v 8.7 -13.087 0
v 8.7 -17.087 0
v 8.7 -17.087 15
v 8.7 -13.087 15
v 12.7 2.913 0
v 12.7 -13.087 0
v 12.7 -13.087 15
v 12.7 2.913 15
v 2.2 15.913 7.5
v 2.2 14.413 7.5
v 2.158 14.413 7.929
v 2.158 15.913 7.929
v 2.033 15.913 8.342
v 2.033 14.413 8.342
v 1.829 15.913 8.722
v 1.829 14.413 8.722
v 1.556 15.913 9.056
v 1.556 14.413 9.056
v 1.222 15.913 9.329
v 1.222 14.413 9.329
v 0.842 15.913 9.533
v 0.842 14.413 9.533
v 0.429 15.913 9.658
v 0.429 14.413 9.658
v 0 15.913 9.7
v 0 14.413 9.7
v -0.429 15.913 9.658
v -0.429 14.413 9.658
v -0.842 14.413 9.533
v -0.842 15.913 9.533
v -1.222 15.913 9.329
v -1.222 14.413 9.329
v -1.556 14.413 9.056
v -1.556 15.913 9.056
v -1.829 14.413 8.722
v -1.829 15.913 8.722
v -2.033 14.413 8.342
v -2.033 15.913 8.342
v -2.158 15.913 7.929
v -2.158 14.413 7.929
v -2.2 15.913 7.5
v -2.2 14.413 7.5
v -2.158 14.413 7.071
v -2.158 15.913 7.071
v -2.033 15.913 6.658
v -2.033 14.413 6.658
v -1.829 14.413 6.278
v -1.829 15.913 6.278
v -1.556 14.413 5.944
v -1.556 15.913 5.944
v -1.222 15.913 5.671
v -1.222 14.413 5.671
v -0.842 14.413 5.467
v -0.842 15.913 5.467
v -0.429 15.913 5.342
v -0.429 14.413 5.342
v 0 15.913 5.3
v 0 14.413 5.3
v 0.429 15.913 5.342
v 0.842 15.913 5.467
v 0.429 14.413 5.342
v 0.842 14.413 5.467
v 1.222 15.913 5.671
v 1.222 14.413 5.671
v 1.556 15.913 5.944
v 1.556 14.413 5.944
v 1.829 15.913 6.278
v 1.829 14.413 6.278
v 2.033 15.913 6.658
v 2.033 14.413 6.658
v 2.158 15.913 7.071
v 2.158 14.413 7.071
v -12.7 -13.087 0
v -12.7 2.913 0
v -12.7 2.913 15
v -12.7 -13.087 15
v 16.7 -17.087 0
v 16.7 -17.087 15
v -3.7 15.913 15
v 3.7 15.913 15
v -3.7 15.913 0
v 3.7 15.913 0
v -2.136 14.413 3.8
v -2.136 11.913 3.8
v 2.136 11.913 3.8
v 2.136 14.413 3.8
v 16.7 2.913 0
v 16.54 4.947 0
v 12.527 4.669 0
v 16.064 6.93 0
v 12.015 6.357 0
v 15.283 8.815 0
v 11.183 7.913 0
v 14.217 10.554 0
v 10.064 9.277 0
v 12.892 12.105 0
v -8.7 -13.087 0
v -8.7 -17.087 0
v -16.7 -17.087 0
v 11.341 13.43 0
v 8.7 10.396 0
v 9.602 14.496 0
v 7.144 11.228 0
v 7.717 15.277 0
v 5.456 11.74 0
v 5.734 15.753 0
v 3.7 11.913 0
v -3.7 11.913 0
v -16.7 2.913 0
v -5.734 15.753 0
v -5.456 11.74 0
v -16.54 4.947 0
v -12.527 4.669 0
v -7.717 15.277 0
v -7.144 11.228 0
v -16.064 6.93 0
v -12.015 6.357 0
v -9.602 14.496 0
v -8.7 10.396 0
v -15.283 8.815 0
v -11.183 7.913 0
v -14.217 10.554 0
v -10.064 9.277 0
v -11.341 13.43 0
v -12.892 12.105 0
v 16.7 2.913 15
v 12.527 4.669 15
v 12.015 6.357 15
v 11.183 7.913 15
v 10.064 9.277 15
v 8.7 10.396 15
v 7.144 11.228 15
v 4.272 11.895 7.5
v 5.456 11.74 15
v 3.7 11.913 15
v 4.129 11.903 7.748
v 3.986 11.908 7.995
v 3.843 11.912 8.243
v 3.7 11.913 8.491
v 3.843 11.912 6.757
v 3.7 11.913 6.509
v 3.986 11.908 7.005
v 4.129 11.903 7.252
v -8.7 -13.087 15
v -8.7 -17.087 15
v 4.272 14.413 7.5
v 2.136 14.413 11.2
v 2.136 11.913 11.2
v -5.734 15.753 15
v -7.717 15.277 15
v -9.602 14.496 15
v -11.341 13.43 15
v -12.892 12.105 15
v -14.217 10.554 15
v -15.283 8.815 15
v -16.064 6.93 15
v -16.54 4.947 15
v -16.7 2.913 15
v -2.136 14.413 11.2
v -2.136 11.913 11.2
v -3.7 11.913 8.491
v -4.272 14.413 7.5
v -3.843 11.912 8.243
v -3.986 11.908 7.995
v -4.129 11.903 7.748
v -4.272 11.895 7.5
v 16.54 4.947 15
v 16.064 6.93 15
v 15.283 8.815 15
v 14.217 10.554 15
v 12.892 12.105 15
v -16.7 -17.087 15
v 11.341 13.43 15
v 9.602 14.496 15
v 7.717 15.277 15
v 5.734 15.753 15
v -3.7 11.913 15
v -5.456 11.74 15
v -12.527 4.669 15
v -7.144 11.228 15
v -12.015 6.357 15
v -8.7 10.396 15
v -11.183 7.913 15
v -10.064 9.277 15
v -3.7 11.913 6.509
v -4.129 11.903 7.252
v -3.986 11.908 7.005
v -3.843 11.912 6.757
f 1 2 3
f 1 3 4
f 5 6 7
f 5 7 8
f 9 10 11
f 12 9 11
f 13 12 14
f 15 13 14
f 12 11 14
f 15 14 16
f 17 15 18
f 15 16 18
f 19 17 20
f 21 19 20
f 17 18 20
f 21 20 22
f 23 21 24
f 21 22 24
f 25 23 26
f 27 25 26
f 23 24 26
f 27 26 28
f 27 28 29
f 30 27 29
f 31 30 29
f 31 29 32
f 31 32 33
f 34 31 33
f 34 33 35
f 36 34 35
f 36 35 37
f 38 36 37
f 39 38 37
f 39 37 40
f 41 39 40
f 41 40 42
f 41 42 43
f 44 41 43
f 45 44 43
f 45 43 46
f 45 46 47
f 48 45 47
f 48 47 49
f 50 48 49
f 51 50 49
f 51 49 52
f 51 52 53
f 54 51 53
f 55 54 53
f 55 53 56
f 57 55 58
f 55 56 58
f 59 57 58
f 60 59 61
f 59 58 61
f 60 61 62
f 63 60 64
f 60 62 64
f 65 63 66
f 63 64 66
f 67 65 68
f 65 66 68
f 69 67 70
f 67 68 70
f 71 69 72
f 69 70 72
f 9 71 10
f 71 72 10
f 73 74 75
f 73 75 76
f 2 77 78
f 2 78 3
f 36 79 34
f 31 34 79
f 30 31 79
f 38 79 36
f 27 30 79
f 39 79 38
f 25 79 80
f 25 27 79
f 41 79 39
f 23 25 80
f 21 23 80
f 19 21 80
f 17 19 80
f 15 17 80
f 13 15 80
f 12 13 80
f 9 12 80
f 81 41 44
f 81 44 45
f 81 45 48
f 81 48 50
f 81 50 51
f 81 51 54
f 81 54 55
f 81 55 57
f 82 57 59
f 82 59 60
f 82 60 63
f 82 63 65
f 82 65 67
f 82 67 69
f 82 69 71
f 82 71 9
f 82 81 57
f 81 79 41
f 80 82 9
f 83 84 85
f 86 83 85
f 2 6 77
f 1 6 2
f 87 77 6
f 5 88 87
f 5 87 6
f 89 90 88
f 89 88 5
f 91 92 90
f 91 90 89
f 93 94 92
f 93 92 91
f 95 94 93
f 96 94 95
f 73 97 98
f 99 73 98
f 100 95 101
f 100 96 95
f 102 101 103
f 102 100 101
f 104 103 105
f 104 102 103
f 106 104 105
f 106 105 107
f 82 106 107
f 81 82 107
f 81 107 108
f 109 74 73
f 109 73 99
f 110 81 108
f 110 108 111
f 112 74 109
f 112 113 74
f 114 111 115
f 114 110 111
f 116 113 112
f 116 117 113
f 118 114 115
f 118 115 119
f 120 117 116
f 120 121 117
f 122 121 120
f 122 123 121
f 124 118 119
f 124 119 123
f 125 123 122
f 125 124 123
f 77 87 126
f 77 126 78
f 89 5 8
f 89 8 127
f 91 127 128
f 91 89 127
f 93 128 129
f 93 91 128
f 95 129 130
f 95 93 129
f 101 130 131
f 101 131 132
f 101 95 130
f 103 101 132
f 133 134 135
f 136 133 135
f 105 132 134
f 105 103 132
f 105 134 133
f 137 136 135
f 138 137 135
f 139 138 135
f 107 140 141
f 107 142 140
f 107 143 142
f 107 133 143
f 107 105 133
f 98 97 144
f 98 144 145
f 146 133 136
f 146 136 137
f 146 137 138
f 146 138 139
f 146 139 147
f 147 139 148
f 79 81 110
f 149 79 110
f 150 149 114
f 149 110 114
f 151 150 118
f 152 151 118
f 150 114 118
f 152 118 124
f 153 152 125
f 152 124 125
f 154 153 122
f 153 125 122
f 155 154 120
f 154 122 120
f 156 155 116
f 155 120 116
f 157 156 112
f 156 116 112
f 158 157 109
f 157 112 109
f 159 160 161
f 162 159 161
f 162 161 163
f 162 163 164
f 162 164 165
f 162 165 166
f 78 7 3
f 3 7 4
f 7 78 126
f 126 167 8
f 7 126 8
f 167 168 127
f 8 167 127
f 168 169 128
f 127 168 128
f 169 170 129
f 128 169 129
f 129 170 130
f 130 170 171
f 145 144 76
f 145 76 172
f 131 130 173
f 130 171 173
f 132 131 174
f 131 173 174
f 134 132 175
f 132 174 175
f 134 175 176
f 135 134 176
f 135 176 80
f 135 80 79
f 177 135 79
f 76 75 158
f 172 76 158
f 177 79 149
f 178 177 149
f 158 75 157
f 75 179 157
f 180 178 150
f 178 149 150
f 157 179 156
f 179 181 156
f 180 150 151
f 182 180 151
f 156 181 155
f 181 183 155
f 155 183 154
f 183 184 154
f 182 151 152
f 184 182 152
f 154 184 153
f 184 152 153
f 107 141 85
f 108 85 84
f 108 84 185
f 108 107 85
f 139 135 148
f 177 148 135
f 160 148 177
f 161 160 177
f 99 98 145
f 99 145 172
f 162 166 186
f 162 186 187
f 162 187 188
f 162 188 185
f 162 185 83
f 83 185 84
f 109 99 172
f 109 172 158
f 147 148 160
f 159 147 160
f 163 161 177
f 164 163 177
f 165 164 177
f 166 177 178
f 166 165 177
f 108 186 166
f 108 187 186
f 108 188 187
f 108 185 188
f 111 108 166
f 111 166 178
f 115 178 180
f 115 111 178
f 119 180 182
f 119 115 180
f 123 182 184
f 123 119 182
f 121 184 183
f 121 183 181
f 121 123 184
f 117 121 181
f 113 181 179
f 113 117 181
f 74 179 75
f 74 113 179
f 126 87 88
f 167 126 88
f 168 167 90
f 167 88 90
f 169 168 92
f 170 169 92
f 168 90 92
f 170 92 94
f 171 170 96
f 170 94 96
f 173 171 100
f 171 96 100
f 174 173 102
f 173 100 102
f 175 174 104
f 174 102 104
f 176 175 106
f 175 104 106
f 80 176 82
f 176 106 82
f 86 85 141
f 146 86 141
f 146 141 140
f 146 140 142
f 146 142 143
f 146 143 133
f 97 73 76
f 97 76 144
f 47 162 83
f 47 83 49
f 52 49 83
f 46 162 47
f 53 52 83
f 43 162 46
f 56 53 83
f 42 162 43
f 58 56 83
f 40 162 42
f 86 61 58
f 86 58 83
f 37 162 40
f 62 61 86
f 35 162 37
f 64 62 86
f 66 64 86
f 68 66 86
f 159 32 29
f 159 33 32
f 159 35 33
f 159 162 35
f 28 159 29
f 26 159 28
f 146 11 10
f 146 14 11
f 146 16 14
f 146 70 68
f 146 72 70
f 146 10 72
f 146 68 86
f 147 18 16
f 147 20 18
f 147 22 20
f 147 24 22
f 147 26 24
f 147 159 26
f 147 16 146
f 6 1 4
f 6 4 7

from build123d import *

# Parameters (mm, degrees)
PAD_DEPTH       = 15
SKETCH001_R     = 2.2
POCKET_DEPTH    = 15.914024
POCKET001_DEPTH = 2.5


with BuildPart() as part:
    # Sketch → Pad (new body)
    with BuildSketch(Plane.XY):
        with BuildLine():
            Line((-12.7, -13.086976), (-8.7, -13.086976))
            Line((-8.7, -13.086976), (-8.7, -17.086976))
            Line((-8.7, -17.086976), (-16.7, -17.086976))
            Line((-16.7, -17.086976), (-16.7, 2.913024))
            ThreePointArc((-3.7, 15.913024), (-12.892388, 12.105412), (-16.7, 2.913024))
            Line((-3.7, 15.913024), (3.7, 15.913024))
            ThreePointArc((16.7, 2.913024), (12.892388, 12.105412), (3.7, 15.913024))
            Line((16.7, 2.913024), (16.7, -17.086976))
            Line((16.7, -17.086976), (8.7, -17.086976))
            Line((8.7, -17.086976), (8.7, -13.086976))
            Line((8.7, -13.086976), (12.7, -13.086976))
            Line((12.7, -13.086976), (12.7, 2.913024))
            ThreePointArc((12.7, 2.913024), (10.063961, 9.276985), (3.7, 11.913024))
            Line((3.7, 11.913024), (-3.7, 11.913024))
            ThreePointArc((-3.7, 11.913024), (-10.063961, 9.276985), (-12.7, 2.913024))
            Line((-12.7, 2.913024), (-12.7, -13.086976))
        make_face()
    extrude(amount=PAD_DEPTH)

    # Sketch001 → Pocket (cut, through all)
    with BuildSketch(Plane.XZ):
        with Locations((0, 7.5)):
            Circle(SKETCH001_R)
    extrude(amount=-POCKET_DEPTH, mode=Mode.SUBTRACT)

    # Sketch002 (on Face11 of Pocket) → Pocket001 (cut, symmetric)
    with BuildSketch(Plane.XZ.offset(-11.913024)):
        Polygon((2.136196, 11.2), (-2.136196, 11.2), (-4.272392, 7.5), (-2.136196, 3.8), (2.136196, 3.8), (4.272392, 7.5), align=None)
    extrude(amount=POCKET001_DEPTH, both=True, mode=Mode.SUBTRACT)


solid = part.part
